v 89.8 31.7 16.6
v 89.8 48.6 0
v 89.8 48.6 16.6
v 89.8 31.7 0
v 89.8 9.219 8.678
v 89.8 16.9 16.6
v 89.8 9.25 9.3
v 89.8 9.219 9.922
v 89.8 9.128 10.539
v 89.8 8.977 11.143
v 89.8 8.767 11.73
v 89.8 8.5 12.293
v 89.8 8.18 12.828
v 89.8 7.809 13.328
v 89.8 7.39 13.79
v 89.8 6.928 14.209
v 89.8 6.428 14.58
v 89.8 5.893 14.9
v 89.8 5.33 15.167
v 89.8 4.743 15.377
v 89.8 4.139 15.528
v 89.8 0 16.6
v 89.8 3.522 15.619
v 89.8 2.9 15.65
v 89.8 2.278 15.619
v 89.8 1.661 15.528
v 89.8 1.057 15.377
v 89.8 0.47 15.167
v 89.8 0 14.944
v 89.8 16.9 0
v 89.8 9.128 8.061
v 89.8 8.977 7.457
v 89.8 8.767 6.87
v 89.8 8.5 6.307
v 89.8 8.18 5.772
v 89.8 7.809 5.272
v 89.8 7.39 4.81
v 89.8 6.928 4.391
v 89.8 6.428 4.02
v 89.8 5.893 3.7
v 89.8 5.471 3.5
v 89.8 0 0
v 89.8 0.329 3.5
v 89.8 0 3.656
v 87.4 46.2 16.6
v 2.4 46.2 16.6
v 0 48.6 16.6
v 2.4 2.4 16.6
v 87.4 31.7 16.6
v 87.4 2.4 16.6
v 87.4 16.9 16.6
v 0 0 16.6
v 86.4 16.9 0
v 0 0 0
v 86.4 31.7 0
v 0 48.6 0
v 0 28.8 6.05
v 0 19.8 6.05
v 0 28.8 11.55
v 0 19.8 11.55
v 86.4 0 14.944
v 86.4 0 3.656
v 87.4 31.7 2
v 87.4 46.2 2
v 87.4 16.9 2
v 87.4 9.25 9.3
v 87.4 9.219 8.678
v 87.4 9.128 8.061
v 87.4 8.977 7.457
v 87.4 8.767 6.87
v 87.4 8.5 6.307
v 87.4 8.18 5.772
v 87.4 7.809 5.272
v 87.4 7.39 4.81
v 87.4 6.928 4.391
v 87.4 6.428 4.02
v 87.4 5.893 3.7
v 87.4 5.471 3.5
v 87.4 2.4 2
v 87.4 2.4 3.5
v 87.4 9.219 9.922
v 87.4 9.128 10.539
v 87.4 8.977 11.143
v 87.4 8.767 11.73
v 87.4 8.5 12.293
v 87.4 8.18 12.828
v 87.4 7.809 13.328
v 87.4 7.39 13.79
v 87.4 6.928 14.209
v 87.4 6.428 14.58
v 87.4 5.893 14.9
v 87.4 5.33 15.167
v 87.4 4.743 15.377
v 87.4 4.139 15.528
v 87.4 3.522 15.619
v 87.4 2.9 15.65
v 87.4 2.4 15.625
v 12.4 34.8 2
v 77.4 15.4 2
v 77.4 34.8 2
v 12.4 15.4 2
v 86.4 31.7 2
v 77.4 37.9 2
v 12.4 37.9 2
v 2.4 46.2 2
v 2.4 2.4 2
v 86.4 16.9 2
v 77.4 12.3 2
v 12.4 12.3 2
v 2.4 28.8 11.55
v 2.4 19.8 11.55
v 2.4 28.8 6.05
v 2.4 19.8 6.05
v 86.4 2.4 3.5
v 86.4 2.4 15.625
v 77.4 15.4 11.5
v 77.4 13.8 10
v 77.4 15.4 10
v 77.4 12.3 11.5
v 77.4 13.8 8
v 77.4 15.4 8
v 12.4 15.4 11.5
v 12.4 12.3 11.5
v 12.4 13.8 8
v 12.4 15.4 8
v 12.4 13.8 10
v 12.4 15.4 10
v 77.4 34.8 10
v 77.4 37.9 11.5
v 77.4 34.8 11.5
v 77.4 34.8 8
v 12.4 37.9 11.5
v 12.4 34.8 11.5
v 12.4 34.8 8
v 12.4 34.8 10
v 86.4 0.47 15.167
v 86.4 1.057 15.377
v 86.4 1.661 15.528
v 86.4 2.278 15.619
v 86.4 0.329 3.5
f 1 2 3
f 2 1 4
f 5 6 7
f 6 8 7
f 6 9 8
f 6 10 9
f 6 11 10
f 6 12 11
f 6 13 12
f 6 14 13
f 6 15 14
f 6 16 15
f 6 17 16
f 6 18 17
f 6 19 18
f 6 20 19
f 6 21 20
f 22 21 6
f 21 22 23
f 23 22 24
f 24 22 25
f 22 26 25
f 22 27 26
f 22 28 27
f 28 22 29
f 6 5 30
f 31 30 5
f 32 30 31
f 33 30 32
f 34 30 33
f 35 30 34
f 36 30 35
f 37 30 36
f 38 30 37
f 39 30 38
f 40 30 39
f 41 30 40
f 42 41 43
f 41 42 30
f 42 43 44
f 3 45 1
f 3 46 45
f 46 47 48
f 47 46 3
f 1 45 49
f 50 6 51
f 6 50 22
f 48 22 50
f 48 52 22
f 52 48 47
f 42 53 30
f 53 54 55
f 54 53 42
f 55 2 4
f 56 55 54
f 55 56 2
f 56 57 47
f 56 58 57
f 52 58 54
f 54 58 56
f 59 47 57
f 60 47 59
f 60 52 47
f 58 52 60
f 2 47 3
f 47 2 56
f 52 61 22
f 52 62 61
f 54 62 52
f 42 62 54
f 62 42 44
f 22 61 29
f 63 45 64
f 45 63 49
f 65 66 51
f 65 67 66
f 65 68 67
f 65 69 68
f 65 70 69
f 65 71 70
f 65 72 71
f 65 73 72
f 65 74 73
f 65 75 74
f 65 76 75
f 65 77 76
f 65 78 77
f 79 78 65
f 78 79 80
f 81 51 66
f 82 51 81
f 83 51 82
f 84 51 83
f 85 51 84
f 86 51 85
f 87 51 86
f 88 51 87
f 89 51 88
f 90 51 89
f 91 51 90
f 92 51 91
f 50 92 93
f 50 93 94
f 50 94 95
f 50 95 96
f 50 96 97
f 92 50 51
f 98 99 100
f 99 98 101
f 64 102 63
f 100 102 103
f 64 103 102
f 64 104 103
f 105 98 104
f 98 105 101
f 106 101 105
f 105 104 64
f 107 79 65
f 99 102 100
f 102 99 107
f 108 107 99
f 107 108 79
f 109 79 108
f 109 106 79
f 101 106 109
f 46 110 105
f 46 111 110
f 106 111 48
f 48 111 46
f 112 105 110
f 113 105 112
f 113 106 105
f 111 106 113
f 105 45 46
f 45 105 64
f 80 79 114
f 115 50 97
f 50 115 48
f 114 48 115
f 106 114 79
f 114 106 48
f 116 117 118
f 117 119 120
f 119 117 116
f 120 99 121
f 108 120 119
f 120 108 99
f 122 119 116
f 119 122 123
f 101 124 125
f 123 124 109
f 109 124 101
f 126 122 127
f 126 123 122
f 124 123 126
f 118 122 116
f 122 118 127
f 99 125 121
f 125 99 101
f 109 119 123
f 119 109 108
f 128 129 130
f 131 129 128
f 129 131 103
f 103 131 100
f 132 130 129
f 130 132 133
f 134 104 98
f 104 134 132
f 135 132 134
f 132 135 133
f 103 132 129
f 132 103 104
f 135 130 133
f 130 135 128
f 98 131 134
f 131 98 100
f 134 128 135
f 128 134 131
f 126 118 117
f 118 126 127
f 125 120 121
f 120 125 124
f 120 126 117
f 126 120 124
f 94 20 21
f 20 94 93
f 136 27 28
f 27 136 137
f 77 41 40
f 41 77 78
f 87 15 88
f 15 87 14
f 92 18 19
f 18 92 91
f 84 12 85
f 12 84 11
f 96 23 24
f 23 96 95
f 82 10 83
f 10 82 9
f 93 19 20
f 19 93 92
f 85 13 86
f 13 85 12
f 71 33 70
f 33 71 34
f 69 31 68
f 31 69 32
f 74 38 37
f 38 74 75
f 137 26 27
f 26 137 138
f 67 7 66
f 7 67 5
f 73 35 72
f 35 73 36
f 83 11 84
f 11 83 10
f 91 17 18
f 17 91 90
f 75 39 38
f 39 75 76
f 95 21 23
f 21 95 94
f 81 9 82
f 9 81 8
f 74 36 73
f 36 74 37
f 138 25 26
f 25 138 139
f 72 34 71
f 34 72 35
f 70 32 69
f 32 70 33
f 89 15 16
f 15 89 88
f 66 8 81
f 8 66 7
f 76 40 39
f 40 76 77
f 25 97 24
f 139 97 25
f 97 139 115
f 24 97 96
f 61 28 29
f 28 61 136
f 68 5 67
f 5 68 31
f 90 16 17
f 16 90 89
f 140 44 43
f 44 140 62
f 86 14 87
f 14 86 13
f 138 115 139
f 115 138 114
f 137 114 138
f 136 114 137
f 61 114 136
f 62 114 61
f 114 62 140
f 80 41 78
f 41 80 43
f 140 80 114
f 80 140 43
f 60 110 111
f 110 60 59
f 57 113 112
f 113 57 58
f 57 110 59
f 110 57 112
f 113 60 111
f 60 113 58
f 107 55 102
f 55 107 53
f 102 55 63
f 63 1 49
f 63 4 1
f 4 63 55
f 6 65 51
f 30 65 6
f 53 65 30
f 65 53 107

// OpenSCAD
//
// teensy-case.scad
// A printable case for a Teensy 4.1 with the PJRC Ethernet kit, a BNC
// reference input and the board's own USB reachable from outside.
//
// Three connectors and nothing else, which is the whole design: network
// in, reference in, USB for power and programming.
//
//   openscad -o teensy-case-body.stl -D part=\"body\" teensy-case.scad
//   openscad -o teensy-case-lid.stl  -D part=\"lid\"  teensy-case.scad
//
// EVERY DIMENSION THAT TOUCHES A BOUGHT PART IS A VARIABLE, and the ones
// worth measuring before printing are marked. A case that is 0.4 mm out
// on a panel cut-out is a case that gets printed twice.
//
// The Teensy 4.1 has NO mounting holes. It is held here the way it is
// held on every sled: by its long edges, in a pair of slots, with a lip
// at each end. Nothing screws to the board.
//

part = "body";          // "body", "lid", or "both" for a look at it

// ---------------------------------------------------------------- board

board_length      = 61.0;   // Teensy 4.1, PJRC's figure
board_width       = 17.8;
board_thickness   = 1.6;
// Under the board: the pin headers if they are fitted, and the ribbon
// cable that reaches the Ethernet kit. MEASURE if the board is socketed.
under_board       = 6.0;
// Over the board: components, and the SD card that has to come out.
over_board        = 7.0;

// The slot the board's edge sits in. 0.4 is a print-and-fit number on a
// 0.4 mm nozzle; tighten it if the board rattles, loosen it if it fights.
edge_slot_depth   = 1.6;
edge_slot_clear   = 0.4;

// --------------------------------------------------------- the case box

wall              = 2.4;
floor_thickness   = 2.0;
// Room at each end for the USB connector at one and the ribbon cable's
// bend radius at the other.
end_clearance     = 12.0;
// Across: the board, plus room down one side for the level shifter and
// the wiring from the BNC.
side_clearance    = 26.0;

inner_length      = board_length + 2 * end_clearance;
inner_width       = board_width + side_clearance;
inner_height      = under_board + board_thickness + over_board;

// ------------------------------------------------------- the connectors

// RJ45, as a snap-in keystone. The MagJack stays inside on its own board
// and a short patch lead reaches this: what a yanked cable pulls on is
// then the keystone, not fifteen hand-soldered joints.
// MEASURE the keystone: 14.8 x 20.6 is the common one, not the only one.
keystone_width    = 14.8;
keystone_height   = 20.6;

// BNC bulkhead. 12.7 mm is the usual 1/2 inch thread; some are 12.0.
// MEASURE the one that arrives.
bnc_hole          = 12.7;
// The flat that stops the socket turning when the nut is done up. Set to
// 0 for a plain round hole.
bnc_flat          = 11.6;

// The Teensy's own micro-B socket, reached through the end wall. It sits
// centred on the board's width, hard against the end of the PCB.
usb_width         = 9.0;
usb_height        = 5.5;
// How far the socket's face sits back from the end of the PCB, plus the
// room a plug's moulding needs. Generous on purpose: a tight USB cut-out
// is the one that stops a cable seating.
usb_relief        = 2.0;

// ------------------------------------------------------------ the lid

lid_thickness     = 2.0;
// The lip that locates the lid inside the walls.
lid_lip           = 1.2;
lid_clear         = 0.3;

// Vents. The crystal's drift is what the servo spends its time
// correcting, and a sealed box in a warm rack gives it more to correct.
vent_slot         = 2.4;
vent_gap          = 4.0;

// ------------------------------------------------------------- helpers

module board_slots() {
    // Two slots, one down each long side, holding the PCB by its edges.
    slot_z = floor_thickness + under_board;
    for (side = [0, 1]) {
        translate([end_clearance - 2,
                   side == 0 ? side_wall_offset() - edge_slot_depth
                             : side_wall_offset() + board_width,
                   slot_z])
            cube([board_length + 4, edge_slot_depth, board_thickness + edge_slot_clear]);
    }
}

function side_wall_offset() = (inner_width - board_width) / 2;

module shell() {
    difference() {
        cube([inner_length + 2 * wall, inner_width + 2 * wall,
              inner_height + floor_thickness]);
        translate([wall, wall, floor_thickness])
            cube([inner_length, inner_width, inner_height + 1]);
    }
}

module board_rails() {
    // The rails the slots are cut into: two ribs standing off the floor.
    rail_height = floor_thickness + under_board + board_thickness + edge_slot_clear + 1.5;
    for (side = [0, 1]) {
        translate([wall + end_clearance - 2,
                   wall + (side == 0 ? side_wall_offset() - edge_slot_depth - 1.5
                                     : side_wall_offset() + board_width + edge_slot_depth),
                   0])
            cube([board_length + 4, 1.5 + edge_slot_depth, rail_height]);
    }
}

module board_slot_cuts() {
    slot_z = floor_thickness + under_board;
    for (side = [0, 1]) {
        translate([wall + end_clearance - 3,
                   wall + (side == 0 ? side_wall_offset() - edge_slot_depth
                                     : side_wall_offset() + board_width),
                   slot_z])
            cube([board_length + 6, edge_slot_depth, board_thickness + edge_slot_clear]);
    }
}

module usb_cutout() {
    // Through the end wall, centred on the board.
    z = floor_thickness + under_board + board_thickness / 2 - usb_height / 2;
    translate([-1, wall + side_wall_offset() + board_width / 2 - usb_width / 2, z])
        cube([wall + usb_relief + 2, usb_width, usb_height]);
}

module keystone_cutout() {
    // Through the far end wall.
    z = floor_thickness + (inner_height - keystone_height) / 2;
    translate([inner_length + 2 * wall - wall - 1,
               wall + inner_width / 2 - keystone_width / 2, z])
        cube([wall + 2, keystone_width, keystone_height]);
}

module bnc_cutout() {
    // Through the same end as the network, so every cable leaves one
    // face and the front of the rack stays clean.
    y = wall + inner_width / 2 - keystone_width / 2 - 14;
    z = floor_thickness + inner_height / 2;
    translate([inner_length + 2 * wall - wall - 1, y, z])
        rotate([0, 90, 0])
            difference() {
                cylinder(h = wall + 2, d = bnc_hole, $fn = 64);
                if (bnc_flat > 0) {
                    translate([bnc_flat / 2, -bnc_hole, -1])
                        cube([bnc_hole, 2 * bnc_hole, wall + 4]);
                }
            }
}

module vents() {
    count = floor((inner_length - 20) / vent_gap);
    for (i = [0 : count - 1]) {
        translate([wall + 10 + i * vent_gap, wall + 6,
                   inner_height + floor_thickness - 1])
            cube([vent_slot, inner_width - 12, lid_thickness + 4]);
    }
}

// --------------------------------------------------------------- parts

module body() {
    difference() {
        union() {
            shell();
            board_rails();
        }
        board_slot_cuts();
        usb_cutout();
        keystone_cutout();
        bnc_cutout();
    }
}

module lid() {
    union() {
        difference() {
            cube([inner_length + 2 * wall, inner_width + 2 * wall, lid_thickness]);
            vents();
        }
        // The lip that drops inside the walls and locates it.
        translate([wall + lid_clear, wall + lid_clear, -lid_lip])
            cube([inner_length - 2 * lid_clear, inner_width - 2 * lid_clear, lid_lip]);
    }
}

if (part == "body") body();
else if (part == "lid") translate([0, 0, inner_height + floor_thickness + 5]) lid();
else {
    body();
    translate([0, 0, inner_height + floor_thickness + 5]) lid();
}
